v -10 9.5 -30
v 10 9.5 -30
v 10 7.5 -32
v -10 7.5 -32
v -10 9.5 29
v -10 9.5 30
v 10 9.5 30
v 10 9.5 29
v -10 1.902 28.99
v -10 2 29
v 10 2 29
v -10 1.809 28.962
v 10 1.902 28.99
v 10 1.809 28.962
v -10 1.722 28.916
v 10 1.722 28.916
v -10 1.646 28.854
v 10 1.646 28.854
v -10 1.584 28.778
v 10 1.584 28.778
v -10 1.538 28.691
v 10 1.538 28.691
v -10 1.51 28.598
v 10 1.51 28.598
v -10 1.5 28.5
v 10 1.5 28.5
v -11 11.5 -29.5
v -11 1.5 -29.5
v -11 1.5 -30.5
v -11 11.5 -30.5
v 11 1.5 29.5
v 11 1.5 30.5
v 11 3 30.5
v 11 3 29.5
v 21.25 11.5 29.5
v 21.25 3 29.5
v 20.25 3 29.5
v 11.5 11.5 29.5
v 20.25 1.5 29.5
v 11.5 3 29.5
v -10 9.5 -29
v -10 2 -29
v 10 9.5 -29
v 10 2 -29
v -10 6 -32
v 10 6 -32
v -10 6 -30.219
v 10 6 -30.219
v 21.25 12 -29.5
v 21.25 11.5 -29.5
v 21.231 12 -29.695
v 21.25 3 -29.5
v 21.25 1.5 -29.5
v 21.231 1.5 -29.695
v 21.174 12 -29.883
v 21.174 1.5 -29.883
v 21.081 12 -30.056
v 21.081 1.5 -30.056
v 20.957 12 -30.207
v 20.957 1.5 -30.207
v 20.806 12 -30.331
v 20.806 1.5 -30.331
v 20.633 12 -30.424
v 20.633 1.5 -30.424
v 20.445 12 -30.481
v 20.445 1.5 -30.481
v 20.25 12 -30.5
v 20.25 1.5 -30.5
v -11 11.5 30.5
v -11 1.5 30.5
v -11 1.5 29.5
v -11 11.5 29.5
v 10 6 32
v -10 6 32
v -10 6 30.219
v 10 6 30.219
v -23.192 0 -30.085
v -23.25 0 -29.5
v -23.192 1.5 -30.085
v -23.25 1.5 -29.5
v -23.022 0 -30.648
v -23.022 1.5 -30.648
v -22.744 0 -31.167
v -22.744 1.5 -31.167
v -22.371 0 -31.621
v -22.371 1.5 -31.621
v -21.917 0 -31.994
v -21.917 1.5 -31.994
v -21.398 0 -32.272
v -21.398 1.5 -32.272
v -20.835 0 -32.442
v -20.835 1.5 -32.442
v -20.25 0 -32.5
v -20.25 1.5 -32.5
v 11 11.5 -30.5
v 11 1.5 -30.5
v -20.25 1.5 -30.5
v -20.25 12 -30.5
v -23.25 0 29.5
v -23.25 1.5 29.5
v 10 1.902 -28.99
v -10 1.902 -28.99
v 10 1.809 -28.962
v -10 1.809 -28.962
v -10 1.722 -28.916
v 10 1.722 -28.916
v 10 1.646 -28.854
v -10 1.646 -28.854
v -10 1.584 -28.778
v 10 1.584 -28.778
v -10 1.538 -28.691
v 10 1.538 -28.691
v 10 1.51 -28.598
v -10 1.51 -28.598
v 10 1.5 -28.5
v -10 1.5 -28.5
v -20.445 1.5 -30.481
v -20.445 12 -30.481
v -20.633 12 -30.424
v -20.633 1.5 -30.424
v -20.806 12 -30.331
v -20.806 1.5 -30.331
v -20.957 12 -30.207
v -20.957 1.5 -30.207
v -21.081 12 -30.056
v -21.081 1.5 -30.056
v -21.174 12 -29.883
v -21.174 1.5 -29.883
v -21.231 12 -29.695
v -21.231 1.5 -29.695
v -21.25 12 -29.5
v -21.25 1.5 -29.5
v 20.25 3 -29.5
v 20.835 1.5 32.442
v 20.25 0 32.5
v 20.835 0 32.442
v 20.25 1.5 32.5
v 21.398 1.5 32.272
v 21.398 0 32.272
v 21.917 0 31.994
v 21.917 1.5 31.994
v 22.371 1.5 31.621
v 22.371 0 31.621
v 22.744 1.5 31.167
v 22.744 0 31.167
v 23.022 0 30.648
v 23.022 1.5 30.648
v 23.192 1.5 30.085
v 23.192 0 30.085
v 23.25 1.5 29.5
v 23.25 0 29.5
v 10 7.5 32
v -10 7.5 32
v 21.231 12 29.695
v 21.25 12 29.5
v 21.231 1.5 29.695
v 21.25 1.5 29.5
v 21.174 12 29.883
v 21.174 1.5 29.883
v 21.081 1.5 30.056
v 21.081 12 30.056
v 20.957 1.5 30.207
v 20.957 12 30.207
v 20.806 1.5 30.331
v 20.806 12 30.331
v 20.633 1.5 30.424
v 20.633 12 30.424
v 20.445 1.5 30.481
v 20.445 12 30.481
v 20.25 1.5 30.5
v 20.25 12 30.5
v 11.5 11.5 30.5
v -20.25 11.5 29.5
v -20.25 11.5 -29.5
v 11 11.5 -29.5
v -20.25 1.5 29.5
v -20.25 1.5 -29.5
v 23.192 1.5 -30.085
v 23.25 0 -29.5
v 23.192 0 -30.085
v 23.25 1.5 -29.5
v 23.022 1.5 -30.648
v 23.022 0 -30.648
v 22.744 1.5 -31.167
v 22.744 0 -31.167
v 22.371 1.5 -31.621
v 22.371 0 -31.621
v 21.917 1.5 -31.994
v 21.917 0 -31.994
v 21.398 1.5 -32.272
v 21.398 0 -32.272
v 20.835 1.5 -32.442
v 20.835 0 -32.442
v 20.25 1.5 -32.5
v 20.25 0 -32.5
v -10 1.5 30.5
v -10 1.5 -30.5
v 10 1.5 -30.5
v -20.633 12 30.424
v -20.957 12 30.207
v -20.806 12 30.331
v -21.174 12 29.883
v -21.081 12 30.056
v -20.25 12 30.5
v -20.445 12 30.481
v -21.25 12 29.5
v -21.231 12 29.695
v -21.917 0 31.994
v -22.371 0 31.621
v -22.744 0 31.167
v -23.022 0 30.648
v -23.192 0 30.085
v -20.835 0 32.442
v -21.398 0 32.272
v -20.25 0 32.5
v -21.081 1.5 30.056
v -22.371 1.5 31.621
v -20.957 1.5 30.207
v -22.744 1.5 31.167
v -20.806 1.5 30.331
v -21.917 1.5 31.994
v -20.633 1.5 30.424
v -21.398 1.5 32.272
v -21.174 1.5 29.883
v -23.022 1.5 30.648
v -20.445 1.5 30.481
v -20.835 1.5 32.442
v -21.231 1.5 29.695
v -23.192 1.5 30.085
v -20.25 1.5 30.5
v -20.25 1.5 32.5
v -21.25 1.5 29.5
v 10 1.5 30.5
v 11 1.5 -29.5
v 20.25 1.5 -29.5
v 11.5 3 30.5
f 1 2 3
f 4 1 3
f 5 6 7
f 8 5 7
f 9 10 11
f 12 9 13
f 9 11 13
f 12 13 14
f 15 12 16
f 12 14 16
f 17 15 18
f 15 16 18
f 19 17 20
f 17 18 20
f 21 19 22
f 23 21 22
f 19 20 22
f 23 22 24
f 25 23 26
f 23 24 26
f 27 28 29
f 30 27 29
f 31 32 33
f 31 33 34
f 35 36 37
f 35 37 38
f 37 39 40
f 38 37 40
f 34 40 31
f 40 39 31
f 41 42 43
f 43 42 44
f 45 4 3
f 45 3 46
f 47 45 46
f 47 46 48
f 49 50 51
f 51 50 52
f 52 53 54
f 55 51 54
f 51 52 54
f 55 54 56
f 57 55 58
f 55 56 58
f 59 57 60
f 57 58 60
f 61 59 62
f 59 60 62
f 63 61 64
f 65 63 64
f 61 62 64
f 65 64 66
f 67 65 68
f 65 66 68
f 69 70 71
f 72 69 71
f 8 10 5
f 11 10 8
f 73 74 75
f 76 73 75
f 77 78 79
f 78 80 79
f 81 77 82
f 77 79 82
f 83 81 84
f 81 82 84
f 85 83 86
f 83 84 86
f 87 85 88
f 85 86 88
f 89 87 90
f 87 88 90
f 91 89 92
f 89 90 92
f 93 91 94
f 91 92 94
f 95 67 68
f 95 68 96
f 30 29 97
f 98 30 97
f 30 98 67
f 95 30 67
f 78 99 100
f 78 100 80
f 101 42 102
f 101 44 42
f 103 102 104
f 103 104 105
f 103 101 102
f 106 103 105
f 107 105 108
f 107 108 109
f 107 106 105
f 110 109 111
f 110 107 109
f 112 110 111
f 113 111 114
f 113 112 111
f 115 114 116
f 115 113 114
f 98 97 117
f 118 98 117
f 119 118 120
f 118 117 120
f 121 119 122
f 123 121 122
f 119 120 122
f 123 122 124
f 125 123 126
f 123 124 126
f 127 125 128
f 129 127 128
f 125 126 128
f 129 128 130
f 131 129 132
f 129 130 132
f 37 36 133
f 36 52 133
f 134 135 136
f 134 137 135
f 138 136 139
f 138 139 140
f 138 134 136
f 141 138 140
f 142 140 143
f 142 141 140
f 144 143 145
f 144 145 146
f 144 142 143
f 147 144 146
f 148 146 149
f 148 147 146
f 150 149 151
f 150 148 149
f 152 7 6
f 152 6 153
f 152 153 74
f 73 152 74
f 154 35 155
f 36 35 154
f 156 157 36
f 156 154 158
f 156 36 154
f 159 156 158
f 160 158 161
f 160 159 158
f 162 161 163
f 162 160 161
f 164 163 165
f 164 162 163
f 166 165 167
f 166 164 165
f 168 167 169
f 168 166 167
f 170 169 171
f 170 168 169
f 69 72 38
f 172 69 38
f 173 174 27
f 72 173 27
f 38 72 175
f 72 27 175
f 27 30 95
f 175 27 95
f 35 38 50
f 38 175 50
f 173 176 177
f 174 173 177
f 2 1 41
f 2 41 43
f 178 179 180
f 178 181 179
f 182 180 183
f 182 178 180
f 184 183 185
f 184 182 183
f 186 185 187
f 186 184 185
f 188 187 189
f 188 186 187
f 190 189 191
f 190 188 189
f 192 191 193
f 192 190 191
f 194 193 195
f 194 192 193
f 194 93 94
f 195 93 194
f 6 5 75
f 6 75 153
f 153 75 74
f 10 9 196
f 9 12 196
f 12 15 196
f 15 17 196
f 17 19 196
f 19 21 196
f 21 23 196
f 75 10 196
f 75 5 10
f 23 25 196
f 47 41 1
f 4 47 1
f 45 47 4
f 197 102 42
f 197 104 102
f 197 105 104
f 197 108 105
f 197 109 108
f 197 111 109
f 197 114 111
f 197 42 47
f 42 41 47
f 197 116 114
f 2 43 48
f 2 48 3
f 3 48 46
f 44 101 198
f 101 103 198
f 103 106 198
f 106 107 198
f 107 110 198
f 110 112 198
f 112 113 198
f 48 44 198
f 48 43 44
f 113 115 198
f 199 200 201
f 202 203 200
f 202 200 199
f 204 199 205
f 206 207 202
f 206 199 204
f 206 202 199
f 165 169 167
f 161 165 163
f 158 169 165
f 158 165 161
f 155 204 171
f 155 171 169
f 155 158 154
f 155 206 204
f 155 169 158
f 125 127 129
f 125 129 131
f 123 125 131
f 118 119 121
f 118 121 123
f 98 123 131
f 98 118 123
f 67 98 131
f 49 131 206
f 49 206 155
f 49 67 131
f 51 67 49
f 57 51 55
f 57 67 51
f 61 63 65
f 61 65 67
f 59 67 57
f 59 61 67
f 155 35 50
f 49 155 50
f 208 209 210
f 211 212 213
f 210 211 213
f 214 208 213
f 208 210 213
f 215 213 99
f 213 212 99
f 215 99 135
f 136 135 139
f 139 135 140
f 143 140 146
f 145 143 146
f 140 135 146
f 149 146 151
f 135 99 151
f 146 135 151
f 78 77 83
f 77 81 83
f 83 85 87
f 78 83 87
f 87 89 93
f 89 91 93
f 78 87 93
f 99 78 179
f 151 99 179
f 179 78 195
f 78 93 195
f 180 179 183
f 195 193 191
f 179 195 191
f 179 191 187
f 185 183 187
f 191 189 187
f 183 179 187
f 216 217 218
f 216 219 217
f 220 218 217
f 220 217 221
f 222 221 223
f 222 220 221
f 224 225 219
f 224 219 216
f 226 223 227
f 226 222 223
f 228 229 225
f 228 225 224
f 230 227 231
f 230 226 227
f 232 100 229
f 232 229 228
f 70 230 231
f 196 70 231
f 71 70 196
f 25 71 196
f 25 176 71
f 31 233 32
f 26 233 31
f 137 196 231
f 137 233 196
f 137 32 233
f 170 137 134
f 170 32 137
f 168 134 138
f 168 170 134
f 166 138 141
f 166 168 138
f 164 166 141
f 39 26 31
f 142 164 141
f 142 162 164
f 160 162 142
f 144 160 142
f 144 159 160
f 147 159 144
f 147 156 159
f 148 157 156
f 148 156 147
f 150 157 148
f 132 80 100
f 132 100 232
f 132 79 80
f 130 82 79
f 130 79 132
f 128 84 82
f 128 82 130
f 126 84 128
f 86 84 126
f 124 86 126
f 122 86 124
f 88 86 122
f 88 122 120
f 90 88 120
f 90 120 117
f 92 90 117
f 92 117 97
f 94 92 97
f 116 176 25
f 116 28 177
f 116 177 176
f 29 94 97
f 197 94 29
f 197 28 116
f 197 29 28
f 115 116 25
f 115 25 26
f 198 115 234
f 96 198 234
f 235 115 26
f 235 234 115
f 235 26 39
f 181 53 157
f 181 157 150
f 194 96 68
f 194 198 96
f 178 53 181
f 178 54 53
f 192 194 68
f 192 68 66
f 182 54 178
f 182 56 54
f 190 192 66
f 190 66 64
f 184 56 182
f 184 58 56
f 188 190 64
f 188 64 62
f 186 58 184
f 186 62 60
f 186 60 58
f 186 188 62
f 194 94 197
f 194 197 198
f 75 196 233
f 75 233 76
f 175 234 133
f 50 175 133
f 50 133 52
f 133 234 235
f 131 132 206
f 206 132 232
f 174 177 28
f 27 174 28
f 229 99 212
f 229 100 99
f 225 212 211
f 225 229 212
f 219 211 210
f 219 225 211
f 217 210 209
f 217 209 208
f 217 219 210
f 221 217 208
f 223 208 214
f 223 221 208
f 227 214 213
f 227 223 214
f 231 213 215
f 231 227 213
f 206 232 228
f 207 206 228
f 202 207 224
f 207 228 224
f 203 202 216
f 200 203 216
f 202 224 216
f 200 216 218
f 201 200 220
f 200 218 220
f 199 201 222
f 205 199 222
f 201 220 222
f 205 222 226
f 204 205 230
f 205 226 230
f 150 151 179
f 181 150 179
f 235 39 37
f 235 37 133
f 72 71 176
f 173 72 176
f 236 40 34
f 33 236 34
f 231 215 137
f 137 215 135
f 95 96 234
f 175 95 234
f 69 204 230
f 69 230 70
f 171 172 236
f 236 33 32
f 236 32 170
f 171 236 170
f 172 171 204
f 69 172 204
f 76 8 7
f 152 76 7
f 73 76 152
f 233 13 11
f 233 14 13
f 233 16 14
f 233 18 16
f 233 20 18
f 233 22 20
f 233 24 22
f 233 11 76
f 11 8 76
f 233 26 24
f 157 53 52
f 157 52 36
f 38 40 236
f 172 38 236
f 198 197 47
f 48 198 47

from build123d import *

# Parameters (mm, degrees)
SKETCH1_W            = 46.5
SKETCH1_H            = 65
BOSS_EXTRUDE1_DEPTH  = 1.5
FILLET1_R            = 3
SKETCH2_W            = 20
SKETCH2_H            = 1.5
BOSS_EXTRUDE2_DEPTH  = 8
CUT_EXTRUDE1_DEPTH   = 24
BOSS_EXTRUDE5_DEPTH  = 20
FILLET4_R            = 0.5
FILLET4_OF_MIRROR1_R = 0.5
BOSS_EXTRUDE6_DEPTH  = 1.5
BOSS_EXTRUDE7_DEPTH  = 0.5
BOSS_EXTRUDE8_START  = -9
BOSS_EXTRUDE8_DEPTH  = 9


with BuildPart() as part:
    # Sketch1 → Boss-Extrude1 (new body)
    with BuildSketch(Plane(origin=(0, 0, 0), x_dir=(1, 0, 0), z_dir=(0, 1, 0))):
        Rectangle(SKETCH1_W, SKETCH1_H)
    extrude(amount=BOSS_EXTRUDE1_DEPTH)

    # Fillet1
    fillet1_edges = [part.edges().sort_by_distance(p)[0] for p in [
        (23.25, 0.75, 32.5),
        (-23.25, 0.75, 32.5),
        (-23.25, 0.75, -32.5),
        (23.25, 0.75, -32.5),
    ]]
    fillet(fillet1_edges, radius=FILLET1_R)

    # Sketch2 → Boss-Extrude2 (add)
    with BuildSketch(Plane(origin=(0, 1.5, 0), x_dir=(1, 0, 0), z_dir=(0, 1, 0))):
        with Locations((0, 29.75)):
            Rectangle(SKETCH2_W, SKETCH2_H)
    boss_extrude2 = extrude(amount=BOSS_EXTRUDE2_DEPTH)

    # Sketch5 → Cut-Extrude1 (cut)
    with BuildSketch(Plane.ZY.offset(10)):
        Polygon((-30.5, 9.5), (-30.5, 1.5), (-30, 9.5), align=None)
    cut_extrude1 = extrude(amount=-CUT_EXTRUDE1_DEPTH, mode=Mode.SUBTRACT)

    # Sketch6 → Boss-Extrude5 (add)
    with BuildSketch(Plane.ZY.offset(10)):
        Polygon((-29, 9.5), (-30, 9.5), (-32, 7.5), (-32, 6), (-29, 6), align=None)
    boss_extrude5 = extrude(amount=-BOSS_EXTRUDE5_DEPTH)

    # Fillet4
    fillet4_edges = [part.edges().sort_by_distance(p)[0] for p in [
        (0, 1.5, -29),
    ]]
    fillet(fillet4_edges, radius=FILLET4_R)

    # Mirror1: Boss-Extrude2, Cut-Extrude1, Boss-Extrude5 across plane
    add(boss_extrude2.mirror(Plane.XY))
    add(cut_extrude1.mirror(Plane.XY), mode=Mode.SUBTRACT)
    add(boss_extrude5.mirror(Plane.XY))

    # Fillet4 of Mirror1
    fillet4_of_mirror1_edges = [part.edges().sort_by_distance(p)[0] for p in [
        (0, 1.5, 29),
    ]]
    fillet(fillet4_of_mirror1_edges, radius=FILLET4_OF_MIRROR1_R)

    # Sketch7 → Boss-Extrude6 (add)
    with BuildSketch(Plane(origin=(0, 1.5, 0), x_dir=(1, 0, 0), z_dir=(0, 1, 0))):
        with BuildLine():
            Line((-11, 30.5), (-20.25, 30.5))
            ThreePointArc((-20.25, 30.5), (-20.957106781, 30.207106781), (-21.25, 29.5))
            Line((-21.25, 29.5), (-21.25, -29.5))
            ThreePointArc((-21.25, -29.5), (-20.957106781, -30.207106781), (-20.25, -30.5))
            Line((-20.25, -30.5), (-11, -30.5))
            Line((-11, -30.5), (-11, -29.5))
            Line((-11, -29.5), (-20.25, -29.5))
            Line((-20.25, -29.5), (-20.25, 29.5))
            Line((-20.25, 29.5), (-11, 29.5))
            Line((-11, 29.5), (-11, 30.5))
        make_face()
        with BuildLine():
            Line((20.25, -29.5), (20.25, 29.5))
            Line((20.25, 29.5), (11, 29.5))
            Line((11, 29.5), (11, 30.5))
            Line((11, 30.5), (20.25, 30.5))
            ThreePointArc((20.25, 30.5), (20.957106781, 30.207106781), (21.25, 29.5))
            Line((21.25, 29.5), (21.25, -29.5))
            ThreePointArc((21.25, -29.5), (20.957106781, -30.207106781), (20.25, -30.5))
            Line((20.25, -30.5), (11, -30.5))
            Line((11, -30.5), (11, -29.5))
            Line((11, -29.5), (20.25, -29.5))
        make_face()
    extrude(amount=BOSS_EXTRUDE6_DEPTH)



with BuildPart() as body_2:
    # Sketch8 → Boss-Extrude7 (new body)
    with BuildSketch(Plane(origin=(0, 11.5, 0), x_dir=(1, 0, 0), z_dir=(0, 1, 0))):
        with BuildLine():
            Line((-11, -30.5), (11, -30.5))
            Line((11, -30.5), (20.25, -30.5))
            ThreePointArc((20.25, -30.5), (20.957106781, -30.207106781), (21.25, -29.5))
            Line((21.25, -29.5), (21.25, 29.5))
            ThreePointArc((21.25, 29.5), (20.957106781, 30.207106781), (20.25, 30.5))
            Line((20.25, 30.5), (11, 30.5))
            Line((11, 30.5), (-11, 30.5))
            Line((-11, 30.5), (-20.25, 30.5))
            ThreePointArc((-20.25, 30.5), (-20.957106781, 30.207106781), (-21.25, 29.5))
            Line((-21.25, 29.5), (-21.25, -29.5))
            ThreePointArc((-21.25, -29.5), (-20.957106781, -30.207106781), (-20.25, -30.5))
            Line((-20.25, -30.5), (-11, -30.5))
        make_face()
    extrude(amount=BOSS_EXTRUDE7_DEPTH)


with BuildPart() as part_1:
    add(part.part)

    add(body_2.part)  # Boss-Extrude8 merges body 2
    # Sketch9 → Boss-Extrude8 (add)
    with BuildSketch(Plane(origin=(0, 12, 0), x_dir=(1, 0, 0), z_dir=(0, 1, 0)).offset(BOSS_EXTRUDE8_START)):
        with BuildLine():
            Line((11, 29.5), (21.25, 29.5))
            ThreePointArc((21.25, 29.5), (20.957106781, 30.207106781), (20.25, 30.5))
            Line((20.25, 30.5), (11, 30.5))
            Line((11, 30.5), (11, 29.5))
        make_face()
        with BuildLine():
            ThreePointArc((20.25, -30.5), (20.957106781, -30.207106781), (21.25, -29.5))
            Line((21.25, -29.5), (11.5, -29.5))
            Line((11.5, -29.5), (11.5, -30.5))
            Line((11.5, -30.5), (20.25, -30.5))
        make_face()
        with BuildLine():
            Line((-11, 29.5), (-11, 30.5))
            Line((-11, 30.5), (-20.25, 30.5))
            ThreePointArc((-20.25, 30.5), (-20.957106781, 30.207106781), (-21.25, 29.5))
            Line((-21.25, 29.5), (-21.25, -29.5))
            ThreePointArc((-21.25, -29.5), (-20.957106781, -30.207106781), (-20.25, -30.5))
            Line((-20.25, -30.5), (-11, -30.5))
            Line((-11, -30.5), (-11, -29.5))
            Line((-11, -29.5), (-20.25, -29.5))
            Line((-20.25, -29.5), (-20.25, 29.5))
            Line((-20.25, 29.5), (-11, 29.5))
        make_face()
    extrude(amount=BOSS_EXTRUDE8_DEPTH)


solid = part_1.part
